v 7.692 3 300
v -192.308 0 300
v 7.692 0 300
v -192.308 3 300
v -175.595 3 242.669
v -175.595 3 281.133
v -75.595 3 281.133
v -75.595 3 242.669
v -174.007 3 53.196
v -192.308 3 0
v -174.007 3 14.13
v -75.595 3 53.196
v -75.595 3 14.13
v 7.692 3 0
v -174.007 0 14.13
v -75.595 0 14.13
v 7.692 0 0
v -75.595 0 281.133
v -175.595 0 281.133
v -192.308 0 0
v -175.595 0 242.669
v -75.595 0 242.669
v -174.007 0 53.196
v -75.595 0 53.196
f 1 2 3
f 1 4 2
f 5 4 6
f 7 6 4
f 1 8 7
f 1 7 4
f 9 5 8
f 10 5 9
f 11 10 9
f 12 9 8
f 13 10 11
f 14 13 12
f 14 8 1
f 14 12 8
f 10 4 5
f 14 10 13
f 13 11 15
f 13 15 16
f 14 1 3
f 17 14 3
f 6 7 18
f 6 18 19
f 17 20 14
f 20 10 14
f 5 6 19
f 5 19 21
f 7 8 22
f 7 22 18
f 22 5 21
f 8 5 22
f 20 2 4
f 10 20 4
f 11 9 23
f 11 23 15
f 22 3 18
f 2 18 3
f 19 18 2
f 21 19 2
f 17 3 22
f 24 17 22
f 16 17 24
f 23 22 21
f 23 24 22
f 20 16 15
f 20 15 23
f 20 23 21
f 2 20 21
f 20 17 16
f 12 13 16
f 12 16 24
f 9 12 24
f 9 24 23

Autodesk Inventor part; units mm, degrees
ref_plane "YZ Plane" through (0, 0, 0) normal (1, 0, 0) x (0, 1, 0)
ref_plane "XZ Plane" through (0, 0, 0) normal (0, 1, 0) x (-1, 0, 0)
ref_plane "XY Plane" through (0, 0, 0) normal (0, 0, 1) x (1, 0, 0)
sketch "Sketch1" plane through (0, 0, 0) normal (0, 0, 1) x (1, 0, 0)
  line L0 (7.6919, 0) -> (-192.3081, 0)
  line L1 (-192.3081, 0) -> (-192.3081, 3)
  line L2 (-192.3081, 3) -> (7.6919, 3)
  line L3 (7.6919, 3) -> (7.6919, 0)
  point P0 (0, 0)
  dimension "d0" = 200
  dimension "d1" = 3
extrude "Extrusion1" add sketch "Sketch1" along normal blind 300
sketch "Sketch2" plane through (-192.3081, 3, 0) normal (0, 1, 0) x (1, 0, 0)
  line L0 (100, -149.5891) -> (200, -149.5891)
  line L1 (200, -149.5891) -> (200, -174.5891)
  line L2 (200, 0) -> (200, -300) projected
  line L3 (200, -174.5891) -> (100, -174.5891)
  line L4 (200, -149.5891) -> (200, -124.5891)
  line L5 (200, -124.5891) -> (100, -124.5891)
  point P0 (192.3081, 0)
sketch "Sketch3" plane through (-192.3081, 3, 0) normal (0, 1, 0) x (1, 0, 0)
  line L0 (100.0009, -229.5915) -> (100.0009, -174.5915)
  line L1 (100.0089, -124.5986) -> (100.0089, -69.5986)
  line L2 (16.7133, -242.6689) -> (116.7133, -242.6689)
  line L3 (116.7133, -242.6689) -> (116.7133, -281.1334)
  line L4 (116.7133, -281.1334) -> (16.7133, -281.1334)
  line L5 (16.7133, -281.1334) -> (16.7133, -242.6689)
  line L6 (18.3008, -14.1302) -> (116.7133, -14.1302)
  line L7 (116.7133, -14.1302) -> (116.7133, -53.1956)
  line L8 (116.7133, -53.1956) -> (18.3008, -53.1956)
  line L9 (18.3008, -53.1956) -> (18.3008, -14.1302)
  point P0 (192.3081, 0)
extrude "Extrusion2" cut sketch "Sketch3" against normal blind 100
sketch "Sketch4" plane through (-192.3081, 3, 0) normal (0, 1, 0) x (1, 0, 0)
  point P0 (192.3081, 0)
properties part number "base"
